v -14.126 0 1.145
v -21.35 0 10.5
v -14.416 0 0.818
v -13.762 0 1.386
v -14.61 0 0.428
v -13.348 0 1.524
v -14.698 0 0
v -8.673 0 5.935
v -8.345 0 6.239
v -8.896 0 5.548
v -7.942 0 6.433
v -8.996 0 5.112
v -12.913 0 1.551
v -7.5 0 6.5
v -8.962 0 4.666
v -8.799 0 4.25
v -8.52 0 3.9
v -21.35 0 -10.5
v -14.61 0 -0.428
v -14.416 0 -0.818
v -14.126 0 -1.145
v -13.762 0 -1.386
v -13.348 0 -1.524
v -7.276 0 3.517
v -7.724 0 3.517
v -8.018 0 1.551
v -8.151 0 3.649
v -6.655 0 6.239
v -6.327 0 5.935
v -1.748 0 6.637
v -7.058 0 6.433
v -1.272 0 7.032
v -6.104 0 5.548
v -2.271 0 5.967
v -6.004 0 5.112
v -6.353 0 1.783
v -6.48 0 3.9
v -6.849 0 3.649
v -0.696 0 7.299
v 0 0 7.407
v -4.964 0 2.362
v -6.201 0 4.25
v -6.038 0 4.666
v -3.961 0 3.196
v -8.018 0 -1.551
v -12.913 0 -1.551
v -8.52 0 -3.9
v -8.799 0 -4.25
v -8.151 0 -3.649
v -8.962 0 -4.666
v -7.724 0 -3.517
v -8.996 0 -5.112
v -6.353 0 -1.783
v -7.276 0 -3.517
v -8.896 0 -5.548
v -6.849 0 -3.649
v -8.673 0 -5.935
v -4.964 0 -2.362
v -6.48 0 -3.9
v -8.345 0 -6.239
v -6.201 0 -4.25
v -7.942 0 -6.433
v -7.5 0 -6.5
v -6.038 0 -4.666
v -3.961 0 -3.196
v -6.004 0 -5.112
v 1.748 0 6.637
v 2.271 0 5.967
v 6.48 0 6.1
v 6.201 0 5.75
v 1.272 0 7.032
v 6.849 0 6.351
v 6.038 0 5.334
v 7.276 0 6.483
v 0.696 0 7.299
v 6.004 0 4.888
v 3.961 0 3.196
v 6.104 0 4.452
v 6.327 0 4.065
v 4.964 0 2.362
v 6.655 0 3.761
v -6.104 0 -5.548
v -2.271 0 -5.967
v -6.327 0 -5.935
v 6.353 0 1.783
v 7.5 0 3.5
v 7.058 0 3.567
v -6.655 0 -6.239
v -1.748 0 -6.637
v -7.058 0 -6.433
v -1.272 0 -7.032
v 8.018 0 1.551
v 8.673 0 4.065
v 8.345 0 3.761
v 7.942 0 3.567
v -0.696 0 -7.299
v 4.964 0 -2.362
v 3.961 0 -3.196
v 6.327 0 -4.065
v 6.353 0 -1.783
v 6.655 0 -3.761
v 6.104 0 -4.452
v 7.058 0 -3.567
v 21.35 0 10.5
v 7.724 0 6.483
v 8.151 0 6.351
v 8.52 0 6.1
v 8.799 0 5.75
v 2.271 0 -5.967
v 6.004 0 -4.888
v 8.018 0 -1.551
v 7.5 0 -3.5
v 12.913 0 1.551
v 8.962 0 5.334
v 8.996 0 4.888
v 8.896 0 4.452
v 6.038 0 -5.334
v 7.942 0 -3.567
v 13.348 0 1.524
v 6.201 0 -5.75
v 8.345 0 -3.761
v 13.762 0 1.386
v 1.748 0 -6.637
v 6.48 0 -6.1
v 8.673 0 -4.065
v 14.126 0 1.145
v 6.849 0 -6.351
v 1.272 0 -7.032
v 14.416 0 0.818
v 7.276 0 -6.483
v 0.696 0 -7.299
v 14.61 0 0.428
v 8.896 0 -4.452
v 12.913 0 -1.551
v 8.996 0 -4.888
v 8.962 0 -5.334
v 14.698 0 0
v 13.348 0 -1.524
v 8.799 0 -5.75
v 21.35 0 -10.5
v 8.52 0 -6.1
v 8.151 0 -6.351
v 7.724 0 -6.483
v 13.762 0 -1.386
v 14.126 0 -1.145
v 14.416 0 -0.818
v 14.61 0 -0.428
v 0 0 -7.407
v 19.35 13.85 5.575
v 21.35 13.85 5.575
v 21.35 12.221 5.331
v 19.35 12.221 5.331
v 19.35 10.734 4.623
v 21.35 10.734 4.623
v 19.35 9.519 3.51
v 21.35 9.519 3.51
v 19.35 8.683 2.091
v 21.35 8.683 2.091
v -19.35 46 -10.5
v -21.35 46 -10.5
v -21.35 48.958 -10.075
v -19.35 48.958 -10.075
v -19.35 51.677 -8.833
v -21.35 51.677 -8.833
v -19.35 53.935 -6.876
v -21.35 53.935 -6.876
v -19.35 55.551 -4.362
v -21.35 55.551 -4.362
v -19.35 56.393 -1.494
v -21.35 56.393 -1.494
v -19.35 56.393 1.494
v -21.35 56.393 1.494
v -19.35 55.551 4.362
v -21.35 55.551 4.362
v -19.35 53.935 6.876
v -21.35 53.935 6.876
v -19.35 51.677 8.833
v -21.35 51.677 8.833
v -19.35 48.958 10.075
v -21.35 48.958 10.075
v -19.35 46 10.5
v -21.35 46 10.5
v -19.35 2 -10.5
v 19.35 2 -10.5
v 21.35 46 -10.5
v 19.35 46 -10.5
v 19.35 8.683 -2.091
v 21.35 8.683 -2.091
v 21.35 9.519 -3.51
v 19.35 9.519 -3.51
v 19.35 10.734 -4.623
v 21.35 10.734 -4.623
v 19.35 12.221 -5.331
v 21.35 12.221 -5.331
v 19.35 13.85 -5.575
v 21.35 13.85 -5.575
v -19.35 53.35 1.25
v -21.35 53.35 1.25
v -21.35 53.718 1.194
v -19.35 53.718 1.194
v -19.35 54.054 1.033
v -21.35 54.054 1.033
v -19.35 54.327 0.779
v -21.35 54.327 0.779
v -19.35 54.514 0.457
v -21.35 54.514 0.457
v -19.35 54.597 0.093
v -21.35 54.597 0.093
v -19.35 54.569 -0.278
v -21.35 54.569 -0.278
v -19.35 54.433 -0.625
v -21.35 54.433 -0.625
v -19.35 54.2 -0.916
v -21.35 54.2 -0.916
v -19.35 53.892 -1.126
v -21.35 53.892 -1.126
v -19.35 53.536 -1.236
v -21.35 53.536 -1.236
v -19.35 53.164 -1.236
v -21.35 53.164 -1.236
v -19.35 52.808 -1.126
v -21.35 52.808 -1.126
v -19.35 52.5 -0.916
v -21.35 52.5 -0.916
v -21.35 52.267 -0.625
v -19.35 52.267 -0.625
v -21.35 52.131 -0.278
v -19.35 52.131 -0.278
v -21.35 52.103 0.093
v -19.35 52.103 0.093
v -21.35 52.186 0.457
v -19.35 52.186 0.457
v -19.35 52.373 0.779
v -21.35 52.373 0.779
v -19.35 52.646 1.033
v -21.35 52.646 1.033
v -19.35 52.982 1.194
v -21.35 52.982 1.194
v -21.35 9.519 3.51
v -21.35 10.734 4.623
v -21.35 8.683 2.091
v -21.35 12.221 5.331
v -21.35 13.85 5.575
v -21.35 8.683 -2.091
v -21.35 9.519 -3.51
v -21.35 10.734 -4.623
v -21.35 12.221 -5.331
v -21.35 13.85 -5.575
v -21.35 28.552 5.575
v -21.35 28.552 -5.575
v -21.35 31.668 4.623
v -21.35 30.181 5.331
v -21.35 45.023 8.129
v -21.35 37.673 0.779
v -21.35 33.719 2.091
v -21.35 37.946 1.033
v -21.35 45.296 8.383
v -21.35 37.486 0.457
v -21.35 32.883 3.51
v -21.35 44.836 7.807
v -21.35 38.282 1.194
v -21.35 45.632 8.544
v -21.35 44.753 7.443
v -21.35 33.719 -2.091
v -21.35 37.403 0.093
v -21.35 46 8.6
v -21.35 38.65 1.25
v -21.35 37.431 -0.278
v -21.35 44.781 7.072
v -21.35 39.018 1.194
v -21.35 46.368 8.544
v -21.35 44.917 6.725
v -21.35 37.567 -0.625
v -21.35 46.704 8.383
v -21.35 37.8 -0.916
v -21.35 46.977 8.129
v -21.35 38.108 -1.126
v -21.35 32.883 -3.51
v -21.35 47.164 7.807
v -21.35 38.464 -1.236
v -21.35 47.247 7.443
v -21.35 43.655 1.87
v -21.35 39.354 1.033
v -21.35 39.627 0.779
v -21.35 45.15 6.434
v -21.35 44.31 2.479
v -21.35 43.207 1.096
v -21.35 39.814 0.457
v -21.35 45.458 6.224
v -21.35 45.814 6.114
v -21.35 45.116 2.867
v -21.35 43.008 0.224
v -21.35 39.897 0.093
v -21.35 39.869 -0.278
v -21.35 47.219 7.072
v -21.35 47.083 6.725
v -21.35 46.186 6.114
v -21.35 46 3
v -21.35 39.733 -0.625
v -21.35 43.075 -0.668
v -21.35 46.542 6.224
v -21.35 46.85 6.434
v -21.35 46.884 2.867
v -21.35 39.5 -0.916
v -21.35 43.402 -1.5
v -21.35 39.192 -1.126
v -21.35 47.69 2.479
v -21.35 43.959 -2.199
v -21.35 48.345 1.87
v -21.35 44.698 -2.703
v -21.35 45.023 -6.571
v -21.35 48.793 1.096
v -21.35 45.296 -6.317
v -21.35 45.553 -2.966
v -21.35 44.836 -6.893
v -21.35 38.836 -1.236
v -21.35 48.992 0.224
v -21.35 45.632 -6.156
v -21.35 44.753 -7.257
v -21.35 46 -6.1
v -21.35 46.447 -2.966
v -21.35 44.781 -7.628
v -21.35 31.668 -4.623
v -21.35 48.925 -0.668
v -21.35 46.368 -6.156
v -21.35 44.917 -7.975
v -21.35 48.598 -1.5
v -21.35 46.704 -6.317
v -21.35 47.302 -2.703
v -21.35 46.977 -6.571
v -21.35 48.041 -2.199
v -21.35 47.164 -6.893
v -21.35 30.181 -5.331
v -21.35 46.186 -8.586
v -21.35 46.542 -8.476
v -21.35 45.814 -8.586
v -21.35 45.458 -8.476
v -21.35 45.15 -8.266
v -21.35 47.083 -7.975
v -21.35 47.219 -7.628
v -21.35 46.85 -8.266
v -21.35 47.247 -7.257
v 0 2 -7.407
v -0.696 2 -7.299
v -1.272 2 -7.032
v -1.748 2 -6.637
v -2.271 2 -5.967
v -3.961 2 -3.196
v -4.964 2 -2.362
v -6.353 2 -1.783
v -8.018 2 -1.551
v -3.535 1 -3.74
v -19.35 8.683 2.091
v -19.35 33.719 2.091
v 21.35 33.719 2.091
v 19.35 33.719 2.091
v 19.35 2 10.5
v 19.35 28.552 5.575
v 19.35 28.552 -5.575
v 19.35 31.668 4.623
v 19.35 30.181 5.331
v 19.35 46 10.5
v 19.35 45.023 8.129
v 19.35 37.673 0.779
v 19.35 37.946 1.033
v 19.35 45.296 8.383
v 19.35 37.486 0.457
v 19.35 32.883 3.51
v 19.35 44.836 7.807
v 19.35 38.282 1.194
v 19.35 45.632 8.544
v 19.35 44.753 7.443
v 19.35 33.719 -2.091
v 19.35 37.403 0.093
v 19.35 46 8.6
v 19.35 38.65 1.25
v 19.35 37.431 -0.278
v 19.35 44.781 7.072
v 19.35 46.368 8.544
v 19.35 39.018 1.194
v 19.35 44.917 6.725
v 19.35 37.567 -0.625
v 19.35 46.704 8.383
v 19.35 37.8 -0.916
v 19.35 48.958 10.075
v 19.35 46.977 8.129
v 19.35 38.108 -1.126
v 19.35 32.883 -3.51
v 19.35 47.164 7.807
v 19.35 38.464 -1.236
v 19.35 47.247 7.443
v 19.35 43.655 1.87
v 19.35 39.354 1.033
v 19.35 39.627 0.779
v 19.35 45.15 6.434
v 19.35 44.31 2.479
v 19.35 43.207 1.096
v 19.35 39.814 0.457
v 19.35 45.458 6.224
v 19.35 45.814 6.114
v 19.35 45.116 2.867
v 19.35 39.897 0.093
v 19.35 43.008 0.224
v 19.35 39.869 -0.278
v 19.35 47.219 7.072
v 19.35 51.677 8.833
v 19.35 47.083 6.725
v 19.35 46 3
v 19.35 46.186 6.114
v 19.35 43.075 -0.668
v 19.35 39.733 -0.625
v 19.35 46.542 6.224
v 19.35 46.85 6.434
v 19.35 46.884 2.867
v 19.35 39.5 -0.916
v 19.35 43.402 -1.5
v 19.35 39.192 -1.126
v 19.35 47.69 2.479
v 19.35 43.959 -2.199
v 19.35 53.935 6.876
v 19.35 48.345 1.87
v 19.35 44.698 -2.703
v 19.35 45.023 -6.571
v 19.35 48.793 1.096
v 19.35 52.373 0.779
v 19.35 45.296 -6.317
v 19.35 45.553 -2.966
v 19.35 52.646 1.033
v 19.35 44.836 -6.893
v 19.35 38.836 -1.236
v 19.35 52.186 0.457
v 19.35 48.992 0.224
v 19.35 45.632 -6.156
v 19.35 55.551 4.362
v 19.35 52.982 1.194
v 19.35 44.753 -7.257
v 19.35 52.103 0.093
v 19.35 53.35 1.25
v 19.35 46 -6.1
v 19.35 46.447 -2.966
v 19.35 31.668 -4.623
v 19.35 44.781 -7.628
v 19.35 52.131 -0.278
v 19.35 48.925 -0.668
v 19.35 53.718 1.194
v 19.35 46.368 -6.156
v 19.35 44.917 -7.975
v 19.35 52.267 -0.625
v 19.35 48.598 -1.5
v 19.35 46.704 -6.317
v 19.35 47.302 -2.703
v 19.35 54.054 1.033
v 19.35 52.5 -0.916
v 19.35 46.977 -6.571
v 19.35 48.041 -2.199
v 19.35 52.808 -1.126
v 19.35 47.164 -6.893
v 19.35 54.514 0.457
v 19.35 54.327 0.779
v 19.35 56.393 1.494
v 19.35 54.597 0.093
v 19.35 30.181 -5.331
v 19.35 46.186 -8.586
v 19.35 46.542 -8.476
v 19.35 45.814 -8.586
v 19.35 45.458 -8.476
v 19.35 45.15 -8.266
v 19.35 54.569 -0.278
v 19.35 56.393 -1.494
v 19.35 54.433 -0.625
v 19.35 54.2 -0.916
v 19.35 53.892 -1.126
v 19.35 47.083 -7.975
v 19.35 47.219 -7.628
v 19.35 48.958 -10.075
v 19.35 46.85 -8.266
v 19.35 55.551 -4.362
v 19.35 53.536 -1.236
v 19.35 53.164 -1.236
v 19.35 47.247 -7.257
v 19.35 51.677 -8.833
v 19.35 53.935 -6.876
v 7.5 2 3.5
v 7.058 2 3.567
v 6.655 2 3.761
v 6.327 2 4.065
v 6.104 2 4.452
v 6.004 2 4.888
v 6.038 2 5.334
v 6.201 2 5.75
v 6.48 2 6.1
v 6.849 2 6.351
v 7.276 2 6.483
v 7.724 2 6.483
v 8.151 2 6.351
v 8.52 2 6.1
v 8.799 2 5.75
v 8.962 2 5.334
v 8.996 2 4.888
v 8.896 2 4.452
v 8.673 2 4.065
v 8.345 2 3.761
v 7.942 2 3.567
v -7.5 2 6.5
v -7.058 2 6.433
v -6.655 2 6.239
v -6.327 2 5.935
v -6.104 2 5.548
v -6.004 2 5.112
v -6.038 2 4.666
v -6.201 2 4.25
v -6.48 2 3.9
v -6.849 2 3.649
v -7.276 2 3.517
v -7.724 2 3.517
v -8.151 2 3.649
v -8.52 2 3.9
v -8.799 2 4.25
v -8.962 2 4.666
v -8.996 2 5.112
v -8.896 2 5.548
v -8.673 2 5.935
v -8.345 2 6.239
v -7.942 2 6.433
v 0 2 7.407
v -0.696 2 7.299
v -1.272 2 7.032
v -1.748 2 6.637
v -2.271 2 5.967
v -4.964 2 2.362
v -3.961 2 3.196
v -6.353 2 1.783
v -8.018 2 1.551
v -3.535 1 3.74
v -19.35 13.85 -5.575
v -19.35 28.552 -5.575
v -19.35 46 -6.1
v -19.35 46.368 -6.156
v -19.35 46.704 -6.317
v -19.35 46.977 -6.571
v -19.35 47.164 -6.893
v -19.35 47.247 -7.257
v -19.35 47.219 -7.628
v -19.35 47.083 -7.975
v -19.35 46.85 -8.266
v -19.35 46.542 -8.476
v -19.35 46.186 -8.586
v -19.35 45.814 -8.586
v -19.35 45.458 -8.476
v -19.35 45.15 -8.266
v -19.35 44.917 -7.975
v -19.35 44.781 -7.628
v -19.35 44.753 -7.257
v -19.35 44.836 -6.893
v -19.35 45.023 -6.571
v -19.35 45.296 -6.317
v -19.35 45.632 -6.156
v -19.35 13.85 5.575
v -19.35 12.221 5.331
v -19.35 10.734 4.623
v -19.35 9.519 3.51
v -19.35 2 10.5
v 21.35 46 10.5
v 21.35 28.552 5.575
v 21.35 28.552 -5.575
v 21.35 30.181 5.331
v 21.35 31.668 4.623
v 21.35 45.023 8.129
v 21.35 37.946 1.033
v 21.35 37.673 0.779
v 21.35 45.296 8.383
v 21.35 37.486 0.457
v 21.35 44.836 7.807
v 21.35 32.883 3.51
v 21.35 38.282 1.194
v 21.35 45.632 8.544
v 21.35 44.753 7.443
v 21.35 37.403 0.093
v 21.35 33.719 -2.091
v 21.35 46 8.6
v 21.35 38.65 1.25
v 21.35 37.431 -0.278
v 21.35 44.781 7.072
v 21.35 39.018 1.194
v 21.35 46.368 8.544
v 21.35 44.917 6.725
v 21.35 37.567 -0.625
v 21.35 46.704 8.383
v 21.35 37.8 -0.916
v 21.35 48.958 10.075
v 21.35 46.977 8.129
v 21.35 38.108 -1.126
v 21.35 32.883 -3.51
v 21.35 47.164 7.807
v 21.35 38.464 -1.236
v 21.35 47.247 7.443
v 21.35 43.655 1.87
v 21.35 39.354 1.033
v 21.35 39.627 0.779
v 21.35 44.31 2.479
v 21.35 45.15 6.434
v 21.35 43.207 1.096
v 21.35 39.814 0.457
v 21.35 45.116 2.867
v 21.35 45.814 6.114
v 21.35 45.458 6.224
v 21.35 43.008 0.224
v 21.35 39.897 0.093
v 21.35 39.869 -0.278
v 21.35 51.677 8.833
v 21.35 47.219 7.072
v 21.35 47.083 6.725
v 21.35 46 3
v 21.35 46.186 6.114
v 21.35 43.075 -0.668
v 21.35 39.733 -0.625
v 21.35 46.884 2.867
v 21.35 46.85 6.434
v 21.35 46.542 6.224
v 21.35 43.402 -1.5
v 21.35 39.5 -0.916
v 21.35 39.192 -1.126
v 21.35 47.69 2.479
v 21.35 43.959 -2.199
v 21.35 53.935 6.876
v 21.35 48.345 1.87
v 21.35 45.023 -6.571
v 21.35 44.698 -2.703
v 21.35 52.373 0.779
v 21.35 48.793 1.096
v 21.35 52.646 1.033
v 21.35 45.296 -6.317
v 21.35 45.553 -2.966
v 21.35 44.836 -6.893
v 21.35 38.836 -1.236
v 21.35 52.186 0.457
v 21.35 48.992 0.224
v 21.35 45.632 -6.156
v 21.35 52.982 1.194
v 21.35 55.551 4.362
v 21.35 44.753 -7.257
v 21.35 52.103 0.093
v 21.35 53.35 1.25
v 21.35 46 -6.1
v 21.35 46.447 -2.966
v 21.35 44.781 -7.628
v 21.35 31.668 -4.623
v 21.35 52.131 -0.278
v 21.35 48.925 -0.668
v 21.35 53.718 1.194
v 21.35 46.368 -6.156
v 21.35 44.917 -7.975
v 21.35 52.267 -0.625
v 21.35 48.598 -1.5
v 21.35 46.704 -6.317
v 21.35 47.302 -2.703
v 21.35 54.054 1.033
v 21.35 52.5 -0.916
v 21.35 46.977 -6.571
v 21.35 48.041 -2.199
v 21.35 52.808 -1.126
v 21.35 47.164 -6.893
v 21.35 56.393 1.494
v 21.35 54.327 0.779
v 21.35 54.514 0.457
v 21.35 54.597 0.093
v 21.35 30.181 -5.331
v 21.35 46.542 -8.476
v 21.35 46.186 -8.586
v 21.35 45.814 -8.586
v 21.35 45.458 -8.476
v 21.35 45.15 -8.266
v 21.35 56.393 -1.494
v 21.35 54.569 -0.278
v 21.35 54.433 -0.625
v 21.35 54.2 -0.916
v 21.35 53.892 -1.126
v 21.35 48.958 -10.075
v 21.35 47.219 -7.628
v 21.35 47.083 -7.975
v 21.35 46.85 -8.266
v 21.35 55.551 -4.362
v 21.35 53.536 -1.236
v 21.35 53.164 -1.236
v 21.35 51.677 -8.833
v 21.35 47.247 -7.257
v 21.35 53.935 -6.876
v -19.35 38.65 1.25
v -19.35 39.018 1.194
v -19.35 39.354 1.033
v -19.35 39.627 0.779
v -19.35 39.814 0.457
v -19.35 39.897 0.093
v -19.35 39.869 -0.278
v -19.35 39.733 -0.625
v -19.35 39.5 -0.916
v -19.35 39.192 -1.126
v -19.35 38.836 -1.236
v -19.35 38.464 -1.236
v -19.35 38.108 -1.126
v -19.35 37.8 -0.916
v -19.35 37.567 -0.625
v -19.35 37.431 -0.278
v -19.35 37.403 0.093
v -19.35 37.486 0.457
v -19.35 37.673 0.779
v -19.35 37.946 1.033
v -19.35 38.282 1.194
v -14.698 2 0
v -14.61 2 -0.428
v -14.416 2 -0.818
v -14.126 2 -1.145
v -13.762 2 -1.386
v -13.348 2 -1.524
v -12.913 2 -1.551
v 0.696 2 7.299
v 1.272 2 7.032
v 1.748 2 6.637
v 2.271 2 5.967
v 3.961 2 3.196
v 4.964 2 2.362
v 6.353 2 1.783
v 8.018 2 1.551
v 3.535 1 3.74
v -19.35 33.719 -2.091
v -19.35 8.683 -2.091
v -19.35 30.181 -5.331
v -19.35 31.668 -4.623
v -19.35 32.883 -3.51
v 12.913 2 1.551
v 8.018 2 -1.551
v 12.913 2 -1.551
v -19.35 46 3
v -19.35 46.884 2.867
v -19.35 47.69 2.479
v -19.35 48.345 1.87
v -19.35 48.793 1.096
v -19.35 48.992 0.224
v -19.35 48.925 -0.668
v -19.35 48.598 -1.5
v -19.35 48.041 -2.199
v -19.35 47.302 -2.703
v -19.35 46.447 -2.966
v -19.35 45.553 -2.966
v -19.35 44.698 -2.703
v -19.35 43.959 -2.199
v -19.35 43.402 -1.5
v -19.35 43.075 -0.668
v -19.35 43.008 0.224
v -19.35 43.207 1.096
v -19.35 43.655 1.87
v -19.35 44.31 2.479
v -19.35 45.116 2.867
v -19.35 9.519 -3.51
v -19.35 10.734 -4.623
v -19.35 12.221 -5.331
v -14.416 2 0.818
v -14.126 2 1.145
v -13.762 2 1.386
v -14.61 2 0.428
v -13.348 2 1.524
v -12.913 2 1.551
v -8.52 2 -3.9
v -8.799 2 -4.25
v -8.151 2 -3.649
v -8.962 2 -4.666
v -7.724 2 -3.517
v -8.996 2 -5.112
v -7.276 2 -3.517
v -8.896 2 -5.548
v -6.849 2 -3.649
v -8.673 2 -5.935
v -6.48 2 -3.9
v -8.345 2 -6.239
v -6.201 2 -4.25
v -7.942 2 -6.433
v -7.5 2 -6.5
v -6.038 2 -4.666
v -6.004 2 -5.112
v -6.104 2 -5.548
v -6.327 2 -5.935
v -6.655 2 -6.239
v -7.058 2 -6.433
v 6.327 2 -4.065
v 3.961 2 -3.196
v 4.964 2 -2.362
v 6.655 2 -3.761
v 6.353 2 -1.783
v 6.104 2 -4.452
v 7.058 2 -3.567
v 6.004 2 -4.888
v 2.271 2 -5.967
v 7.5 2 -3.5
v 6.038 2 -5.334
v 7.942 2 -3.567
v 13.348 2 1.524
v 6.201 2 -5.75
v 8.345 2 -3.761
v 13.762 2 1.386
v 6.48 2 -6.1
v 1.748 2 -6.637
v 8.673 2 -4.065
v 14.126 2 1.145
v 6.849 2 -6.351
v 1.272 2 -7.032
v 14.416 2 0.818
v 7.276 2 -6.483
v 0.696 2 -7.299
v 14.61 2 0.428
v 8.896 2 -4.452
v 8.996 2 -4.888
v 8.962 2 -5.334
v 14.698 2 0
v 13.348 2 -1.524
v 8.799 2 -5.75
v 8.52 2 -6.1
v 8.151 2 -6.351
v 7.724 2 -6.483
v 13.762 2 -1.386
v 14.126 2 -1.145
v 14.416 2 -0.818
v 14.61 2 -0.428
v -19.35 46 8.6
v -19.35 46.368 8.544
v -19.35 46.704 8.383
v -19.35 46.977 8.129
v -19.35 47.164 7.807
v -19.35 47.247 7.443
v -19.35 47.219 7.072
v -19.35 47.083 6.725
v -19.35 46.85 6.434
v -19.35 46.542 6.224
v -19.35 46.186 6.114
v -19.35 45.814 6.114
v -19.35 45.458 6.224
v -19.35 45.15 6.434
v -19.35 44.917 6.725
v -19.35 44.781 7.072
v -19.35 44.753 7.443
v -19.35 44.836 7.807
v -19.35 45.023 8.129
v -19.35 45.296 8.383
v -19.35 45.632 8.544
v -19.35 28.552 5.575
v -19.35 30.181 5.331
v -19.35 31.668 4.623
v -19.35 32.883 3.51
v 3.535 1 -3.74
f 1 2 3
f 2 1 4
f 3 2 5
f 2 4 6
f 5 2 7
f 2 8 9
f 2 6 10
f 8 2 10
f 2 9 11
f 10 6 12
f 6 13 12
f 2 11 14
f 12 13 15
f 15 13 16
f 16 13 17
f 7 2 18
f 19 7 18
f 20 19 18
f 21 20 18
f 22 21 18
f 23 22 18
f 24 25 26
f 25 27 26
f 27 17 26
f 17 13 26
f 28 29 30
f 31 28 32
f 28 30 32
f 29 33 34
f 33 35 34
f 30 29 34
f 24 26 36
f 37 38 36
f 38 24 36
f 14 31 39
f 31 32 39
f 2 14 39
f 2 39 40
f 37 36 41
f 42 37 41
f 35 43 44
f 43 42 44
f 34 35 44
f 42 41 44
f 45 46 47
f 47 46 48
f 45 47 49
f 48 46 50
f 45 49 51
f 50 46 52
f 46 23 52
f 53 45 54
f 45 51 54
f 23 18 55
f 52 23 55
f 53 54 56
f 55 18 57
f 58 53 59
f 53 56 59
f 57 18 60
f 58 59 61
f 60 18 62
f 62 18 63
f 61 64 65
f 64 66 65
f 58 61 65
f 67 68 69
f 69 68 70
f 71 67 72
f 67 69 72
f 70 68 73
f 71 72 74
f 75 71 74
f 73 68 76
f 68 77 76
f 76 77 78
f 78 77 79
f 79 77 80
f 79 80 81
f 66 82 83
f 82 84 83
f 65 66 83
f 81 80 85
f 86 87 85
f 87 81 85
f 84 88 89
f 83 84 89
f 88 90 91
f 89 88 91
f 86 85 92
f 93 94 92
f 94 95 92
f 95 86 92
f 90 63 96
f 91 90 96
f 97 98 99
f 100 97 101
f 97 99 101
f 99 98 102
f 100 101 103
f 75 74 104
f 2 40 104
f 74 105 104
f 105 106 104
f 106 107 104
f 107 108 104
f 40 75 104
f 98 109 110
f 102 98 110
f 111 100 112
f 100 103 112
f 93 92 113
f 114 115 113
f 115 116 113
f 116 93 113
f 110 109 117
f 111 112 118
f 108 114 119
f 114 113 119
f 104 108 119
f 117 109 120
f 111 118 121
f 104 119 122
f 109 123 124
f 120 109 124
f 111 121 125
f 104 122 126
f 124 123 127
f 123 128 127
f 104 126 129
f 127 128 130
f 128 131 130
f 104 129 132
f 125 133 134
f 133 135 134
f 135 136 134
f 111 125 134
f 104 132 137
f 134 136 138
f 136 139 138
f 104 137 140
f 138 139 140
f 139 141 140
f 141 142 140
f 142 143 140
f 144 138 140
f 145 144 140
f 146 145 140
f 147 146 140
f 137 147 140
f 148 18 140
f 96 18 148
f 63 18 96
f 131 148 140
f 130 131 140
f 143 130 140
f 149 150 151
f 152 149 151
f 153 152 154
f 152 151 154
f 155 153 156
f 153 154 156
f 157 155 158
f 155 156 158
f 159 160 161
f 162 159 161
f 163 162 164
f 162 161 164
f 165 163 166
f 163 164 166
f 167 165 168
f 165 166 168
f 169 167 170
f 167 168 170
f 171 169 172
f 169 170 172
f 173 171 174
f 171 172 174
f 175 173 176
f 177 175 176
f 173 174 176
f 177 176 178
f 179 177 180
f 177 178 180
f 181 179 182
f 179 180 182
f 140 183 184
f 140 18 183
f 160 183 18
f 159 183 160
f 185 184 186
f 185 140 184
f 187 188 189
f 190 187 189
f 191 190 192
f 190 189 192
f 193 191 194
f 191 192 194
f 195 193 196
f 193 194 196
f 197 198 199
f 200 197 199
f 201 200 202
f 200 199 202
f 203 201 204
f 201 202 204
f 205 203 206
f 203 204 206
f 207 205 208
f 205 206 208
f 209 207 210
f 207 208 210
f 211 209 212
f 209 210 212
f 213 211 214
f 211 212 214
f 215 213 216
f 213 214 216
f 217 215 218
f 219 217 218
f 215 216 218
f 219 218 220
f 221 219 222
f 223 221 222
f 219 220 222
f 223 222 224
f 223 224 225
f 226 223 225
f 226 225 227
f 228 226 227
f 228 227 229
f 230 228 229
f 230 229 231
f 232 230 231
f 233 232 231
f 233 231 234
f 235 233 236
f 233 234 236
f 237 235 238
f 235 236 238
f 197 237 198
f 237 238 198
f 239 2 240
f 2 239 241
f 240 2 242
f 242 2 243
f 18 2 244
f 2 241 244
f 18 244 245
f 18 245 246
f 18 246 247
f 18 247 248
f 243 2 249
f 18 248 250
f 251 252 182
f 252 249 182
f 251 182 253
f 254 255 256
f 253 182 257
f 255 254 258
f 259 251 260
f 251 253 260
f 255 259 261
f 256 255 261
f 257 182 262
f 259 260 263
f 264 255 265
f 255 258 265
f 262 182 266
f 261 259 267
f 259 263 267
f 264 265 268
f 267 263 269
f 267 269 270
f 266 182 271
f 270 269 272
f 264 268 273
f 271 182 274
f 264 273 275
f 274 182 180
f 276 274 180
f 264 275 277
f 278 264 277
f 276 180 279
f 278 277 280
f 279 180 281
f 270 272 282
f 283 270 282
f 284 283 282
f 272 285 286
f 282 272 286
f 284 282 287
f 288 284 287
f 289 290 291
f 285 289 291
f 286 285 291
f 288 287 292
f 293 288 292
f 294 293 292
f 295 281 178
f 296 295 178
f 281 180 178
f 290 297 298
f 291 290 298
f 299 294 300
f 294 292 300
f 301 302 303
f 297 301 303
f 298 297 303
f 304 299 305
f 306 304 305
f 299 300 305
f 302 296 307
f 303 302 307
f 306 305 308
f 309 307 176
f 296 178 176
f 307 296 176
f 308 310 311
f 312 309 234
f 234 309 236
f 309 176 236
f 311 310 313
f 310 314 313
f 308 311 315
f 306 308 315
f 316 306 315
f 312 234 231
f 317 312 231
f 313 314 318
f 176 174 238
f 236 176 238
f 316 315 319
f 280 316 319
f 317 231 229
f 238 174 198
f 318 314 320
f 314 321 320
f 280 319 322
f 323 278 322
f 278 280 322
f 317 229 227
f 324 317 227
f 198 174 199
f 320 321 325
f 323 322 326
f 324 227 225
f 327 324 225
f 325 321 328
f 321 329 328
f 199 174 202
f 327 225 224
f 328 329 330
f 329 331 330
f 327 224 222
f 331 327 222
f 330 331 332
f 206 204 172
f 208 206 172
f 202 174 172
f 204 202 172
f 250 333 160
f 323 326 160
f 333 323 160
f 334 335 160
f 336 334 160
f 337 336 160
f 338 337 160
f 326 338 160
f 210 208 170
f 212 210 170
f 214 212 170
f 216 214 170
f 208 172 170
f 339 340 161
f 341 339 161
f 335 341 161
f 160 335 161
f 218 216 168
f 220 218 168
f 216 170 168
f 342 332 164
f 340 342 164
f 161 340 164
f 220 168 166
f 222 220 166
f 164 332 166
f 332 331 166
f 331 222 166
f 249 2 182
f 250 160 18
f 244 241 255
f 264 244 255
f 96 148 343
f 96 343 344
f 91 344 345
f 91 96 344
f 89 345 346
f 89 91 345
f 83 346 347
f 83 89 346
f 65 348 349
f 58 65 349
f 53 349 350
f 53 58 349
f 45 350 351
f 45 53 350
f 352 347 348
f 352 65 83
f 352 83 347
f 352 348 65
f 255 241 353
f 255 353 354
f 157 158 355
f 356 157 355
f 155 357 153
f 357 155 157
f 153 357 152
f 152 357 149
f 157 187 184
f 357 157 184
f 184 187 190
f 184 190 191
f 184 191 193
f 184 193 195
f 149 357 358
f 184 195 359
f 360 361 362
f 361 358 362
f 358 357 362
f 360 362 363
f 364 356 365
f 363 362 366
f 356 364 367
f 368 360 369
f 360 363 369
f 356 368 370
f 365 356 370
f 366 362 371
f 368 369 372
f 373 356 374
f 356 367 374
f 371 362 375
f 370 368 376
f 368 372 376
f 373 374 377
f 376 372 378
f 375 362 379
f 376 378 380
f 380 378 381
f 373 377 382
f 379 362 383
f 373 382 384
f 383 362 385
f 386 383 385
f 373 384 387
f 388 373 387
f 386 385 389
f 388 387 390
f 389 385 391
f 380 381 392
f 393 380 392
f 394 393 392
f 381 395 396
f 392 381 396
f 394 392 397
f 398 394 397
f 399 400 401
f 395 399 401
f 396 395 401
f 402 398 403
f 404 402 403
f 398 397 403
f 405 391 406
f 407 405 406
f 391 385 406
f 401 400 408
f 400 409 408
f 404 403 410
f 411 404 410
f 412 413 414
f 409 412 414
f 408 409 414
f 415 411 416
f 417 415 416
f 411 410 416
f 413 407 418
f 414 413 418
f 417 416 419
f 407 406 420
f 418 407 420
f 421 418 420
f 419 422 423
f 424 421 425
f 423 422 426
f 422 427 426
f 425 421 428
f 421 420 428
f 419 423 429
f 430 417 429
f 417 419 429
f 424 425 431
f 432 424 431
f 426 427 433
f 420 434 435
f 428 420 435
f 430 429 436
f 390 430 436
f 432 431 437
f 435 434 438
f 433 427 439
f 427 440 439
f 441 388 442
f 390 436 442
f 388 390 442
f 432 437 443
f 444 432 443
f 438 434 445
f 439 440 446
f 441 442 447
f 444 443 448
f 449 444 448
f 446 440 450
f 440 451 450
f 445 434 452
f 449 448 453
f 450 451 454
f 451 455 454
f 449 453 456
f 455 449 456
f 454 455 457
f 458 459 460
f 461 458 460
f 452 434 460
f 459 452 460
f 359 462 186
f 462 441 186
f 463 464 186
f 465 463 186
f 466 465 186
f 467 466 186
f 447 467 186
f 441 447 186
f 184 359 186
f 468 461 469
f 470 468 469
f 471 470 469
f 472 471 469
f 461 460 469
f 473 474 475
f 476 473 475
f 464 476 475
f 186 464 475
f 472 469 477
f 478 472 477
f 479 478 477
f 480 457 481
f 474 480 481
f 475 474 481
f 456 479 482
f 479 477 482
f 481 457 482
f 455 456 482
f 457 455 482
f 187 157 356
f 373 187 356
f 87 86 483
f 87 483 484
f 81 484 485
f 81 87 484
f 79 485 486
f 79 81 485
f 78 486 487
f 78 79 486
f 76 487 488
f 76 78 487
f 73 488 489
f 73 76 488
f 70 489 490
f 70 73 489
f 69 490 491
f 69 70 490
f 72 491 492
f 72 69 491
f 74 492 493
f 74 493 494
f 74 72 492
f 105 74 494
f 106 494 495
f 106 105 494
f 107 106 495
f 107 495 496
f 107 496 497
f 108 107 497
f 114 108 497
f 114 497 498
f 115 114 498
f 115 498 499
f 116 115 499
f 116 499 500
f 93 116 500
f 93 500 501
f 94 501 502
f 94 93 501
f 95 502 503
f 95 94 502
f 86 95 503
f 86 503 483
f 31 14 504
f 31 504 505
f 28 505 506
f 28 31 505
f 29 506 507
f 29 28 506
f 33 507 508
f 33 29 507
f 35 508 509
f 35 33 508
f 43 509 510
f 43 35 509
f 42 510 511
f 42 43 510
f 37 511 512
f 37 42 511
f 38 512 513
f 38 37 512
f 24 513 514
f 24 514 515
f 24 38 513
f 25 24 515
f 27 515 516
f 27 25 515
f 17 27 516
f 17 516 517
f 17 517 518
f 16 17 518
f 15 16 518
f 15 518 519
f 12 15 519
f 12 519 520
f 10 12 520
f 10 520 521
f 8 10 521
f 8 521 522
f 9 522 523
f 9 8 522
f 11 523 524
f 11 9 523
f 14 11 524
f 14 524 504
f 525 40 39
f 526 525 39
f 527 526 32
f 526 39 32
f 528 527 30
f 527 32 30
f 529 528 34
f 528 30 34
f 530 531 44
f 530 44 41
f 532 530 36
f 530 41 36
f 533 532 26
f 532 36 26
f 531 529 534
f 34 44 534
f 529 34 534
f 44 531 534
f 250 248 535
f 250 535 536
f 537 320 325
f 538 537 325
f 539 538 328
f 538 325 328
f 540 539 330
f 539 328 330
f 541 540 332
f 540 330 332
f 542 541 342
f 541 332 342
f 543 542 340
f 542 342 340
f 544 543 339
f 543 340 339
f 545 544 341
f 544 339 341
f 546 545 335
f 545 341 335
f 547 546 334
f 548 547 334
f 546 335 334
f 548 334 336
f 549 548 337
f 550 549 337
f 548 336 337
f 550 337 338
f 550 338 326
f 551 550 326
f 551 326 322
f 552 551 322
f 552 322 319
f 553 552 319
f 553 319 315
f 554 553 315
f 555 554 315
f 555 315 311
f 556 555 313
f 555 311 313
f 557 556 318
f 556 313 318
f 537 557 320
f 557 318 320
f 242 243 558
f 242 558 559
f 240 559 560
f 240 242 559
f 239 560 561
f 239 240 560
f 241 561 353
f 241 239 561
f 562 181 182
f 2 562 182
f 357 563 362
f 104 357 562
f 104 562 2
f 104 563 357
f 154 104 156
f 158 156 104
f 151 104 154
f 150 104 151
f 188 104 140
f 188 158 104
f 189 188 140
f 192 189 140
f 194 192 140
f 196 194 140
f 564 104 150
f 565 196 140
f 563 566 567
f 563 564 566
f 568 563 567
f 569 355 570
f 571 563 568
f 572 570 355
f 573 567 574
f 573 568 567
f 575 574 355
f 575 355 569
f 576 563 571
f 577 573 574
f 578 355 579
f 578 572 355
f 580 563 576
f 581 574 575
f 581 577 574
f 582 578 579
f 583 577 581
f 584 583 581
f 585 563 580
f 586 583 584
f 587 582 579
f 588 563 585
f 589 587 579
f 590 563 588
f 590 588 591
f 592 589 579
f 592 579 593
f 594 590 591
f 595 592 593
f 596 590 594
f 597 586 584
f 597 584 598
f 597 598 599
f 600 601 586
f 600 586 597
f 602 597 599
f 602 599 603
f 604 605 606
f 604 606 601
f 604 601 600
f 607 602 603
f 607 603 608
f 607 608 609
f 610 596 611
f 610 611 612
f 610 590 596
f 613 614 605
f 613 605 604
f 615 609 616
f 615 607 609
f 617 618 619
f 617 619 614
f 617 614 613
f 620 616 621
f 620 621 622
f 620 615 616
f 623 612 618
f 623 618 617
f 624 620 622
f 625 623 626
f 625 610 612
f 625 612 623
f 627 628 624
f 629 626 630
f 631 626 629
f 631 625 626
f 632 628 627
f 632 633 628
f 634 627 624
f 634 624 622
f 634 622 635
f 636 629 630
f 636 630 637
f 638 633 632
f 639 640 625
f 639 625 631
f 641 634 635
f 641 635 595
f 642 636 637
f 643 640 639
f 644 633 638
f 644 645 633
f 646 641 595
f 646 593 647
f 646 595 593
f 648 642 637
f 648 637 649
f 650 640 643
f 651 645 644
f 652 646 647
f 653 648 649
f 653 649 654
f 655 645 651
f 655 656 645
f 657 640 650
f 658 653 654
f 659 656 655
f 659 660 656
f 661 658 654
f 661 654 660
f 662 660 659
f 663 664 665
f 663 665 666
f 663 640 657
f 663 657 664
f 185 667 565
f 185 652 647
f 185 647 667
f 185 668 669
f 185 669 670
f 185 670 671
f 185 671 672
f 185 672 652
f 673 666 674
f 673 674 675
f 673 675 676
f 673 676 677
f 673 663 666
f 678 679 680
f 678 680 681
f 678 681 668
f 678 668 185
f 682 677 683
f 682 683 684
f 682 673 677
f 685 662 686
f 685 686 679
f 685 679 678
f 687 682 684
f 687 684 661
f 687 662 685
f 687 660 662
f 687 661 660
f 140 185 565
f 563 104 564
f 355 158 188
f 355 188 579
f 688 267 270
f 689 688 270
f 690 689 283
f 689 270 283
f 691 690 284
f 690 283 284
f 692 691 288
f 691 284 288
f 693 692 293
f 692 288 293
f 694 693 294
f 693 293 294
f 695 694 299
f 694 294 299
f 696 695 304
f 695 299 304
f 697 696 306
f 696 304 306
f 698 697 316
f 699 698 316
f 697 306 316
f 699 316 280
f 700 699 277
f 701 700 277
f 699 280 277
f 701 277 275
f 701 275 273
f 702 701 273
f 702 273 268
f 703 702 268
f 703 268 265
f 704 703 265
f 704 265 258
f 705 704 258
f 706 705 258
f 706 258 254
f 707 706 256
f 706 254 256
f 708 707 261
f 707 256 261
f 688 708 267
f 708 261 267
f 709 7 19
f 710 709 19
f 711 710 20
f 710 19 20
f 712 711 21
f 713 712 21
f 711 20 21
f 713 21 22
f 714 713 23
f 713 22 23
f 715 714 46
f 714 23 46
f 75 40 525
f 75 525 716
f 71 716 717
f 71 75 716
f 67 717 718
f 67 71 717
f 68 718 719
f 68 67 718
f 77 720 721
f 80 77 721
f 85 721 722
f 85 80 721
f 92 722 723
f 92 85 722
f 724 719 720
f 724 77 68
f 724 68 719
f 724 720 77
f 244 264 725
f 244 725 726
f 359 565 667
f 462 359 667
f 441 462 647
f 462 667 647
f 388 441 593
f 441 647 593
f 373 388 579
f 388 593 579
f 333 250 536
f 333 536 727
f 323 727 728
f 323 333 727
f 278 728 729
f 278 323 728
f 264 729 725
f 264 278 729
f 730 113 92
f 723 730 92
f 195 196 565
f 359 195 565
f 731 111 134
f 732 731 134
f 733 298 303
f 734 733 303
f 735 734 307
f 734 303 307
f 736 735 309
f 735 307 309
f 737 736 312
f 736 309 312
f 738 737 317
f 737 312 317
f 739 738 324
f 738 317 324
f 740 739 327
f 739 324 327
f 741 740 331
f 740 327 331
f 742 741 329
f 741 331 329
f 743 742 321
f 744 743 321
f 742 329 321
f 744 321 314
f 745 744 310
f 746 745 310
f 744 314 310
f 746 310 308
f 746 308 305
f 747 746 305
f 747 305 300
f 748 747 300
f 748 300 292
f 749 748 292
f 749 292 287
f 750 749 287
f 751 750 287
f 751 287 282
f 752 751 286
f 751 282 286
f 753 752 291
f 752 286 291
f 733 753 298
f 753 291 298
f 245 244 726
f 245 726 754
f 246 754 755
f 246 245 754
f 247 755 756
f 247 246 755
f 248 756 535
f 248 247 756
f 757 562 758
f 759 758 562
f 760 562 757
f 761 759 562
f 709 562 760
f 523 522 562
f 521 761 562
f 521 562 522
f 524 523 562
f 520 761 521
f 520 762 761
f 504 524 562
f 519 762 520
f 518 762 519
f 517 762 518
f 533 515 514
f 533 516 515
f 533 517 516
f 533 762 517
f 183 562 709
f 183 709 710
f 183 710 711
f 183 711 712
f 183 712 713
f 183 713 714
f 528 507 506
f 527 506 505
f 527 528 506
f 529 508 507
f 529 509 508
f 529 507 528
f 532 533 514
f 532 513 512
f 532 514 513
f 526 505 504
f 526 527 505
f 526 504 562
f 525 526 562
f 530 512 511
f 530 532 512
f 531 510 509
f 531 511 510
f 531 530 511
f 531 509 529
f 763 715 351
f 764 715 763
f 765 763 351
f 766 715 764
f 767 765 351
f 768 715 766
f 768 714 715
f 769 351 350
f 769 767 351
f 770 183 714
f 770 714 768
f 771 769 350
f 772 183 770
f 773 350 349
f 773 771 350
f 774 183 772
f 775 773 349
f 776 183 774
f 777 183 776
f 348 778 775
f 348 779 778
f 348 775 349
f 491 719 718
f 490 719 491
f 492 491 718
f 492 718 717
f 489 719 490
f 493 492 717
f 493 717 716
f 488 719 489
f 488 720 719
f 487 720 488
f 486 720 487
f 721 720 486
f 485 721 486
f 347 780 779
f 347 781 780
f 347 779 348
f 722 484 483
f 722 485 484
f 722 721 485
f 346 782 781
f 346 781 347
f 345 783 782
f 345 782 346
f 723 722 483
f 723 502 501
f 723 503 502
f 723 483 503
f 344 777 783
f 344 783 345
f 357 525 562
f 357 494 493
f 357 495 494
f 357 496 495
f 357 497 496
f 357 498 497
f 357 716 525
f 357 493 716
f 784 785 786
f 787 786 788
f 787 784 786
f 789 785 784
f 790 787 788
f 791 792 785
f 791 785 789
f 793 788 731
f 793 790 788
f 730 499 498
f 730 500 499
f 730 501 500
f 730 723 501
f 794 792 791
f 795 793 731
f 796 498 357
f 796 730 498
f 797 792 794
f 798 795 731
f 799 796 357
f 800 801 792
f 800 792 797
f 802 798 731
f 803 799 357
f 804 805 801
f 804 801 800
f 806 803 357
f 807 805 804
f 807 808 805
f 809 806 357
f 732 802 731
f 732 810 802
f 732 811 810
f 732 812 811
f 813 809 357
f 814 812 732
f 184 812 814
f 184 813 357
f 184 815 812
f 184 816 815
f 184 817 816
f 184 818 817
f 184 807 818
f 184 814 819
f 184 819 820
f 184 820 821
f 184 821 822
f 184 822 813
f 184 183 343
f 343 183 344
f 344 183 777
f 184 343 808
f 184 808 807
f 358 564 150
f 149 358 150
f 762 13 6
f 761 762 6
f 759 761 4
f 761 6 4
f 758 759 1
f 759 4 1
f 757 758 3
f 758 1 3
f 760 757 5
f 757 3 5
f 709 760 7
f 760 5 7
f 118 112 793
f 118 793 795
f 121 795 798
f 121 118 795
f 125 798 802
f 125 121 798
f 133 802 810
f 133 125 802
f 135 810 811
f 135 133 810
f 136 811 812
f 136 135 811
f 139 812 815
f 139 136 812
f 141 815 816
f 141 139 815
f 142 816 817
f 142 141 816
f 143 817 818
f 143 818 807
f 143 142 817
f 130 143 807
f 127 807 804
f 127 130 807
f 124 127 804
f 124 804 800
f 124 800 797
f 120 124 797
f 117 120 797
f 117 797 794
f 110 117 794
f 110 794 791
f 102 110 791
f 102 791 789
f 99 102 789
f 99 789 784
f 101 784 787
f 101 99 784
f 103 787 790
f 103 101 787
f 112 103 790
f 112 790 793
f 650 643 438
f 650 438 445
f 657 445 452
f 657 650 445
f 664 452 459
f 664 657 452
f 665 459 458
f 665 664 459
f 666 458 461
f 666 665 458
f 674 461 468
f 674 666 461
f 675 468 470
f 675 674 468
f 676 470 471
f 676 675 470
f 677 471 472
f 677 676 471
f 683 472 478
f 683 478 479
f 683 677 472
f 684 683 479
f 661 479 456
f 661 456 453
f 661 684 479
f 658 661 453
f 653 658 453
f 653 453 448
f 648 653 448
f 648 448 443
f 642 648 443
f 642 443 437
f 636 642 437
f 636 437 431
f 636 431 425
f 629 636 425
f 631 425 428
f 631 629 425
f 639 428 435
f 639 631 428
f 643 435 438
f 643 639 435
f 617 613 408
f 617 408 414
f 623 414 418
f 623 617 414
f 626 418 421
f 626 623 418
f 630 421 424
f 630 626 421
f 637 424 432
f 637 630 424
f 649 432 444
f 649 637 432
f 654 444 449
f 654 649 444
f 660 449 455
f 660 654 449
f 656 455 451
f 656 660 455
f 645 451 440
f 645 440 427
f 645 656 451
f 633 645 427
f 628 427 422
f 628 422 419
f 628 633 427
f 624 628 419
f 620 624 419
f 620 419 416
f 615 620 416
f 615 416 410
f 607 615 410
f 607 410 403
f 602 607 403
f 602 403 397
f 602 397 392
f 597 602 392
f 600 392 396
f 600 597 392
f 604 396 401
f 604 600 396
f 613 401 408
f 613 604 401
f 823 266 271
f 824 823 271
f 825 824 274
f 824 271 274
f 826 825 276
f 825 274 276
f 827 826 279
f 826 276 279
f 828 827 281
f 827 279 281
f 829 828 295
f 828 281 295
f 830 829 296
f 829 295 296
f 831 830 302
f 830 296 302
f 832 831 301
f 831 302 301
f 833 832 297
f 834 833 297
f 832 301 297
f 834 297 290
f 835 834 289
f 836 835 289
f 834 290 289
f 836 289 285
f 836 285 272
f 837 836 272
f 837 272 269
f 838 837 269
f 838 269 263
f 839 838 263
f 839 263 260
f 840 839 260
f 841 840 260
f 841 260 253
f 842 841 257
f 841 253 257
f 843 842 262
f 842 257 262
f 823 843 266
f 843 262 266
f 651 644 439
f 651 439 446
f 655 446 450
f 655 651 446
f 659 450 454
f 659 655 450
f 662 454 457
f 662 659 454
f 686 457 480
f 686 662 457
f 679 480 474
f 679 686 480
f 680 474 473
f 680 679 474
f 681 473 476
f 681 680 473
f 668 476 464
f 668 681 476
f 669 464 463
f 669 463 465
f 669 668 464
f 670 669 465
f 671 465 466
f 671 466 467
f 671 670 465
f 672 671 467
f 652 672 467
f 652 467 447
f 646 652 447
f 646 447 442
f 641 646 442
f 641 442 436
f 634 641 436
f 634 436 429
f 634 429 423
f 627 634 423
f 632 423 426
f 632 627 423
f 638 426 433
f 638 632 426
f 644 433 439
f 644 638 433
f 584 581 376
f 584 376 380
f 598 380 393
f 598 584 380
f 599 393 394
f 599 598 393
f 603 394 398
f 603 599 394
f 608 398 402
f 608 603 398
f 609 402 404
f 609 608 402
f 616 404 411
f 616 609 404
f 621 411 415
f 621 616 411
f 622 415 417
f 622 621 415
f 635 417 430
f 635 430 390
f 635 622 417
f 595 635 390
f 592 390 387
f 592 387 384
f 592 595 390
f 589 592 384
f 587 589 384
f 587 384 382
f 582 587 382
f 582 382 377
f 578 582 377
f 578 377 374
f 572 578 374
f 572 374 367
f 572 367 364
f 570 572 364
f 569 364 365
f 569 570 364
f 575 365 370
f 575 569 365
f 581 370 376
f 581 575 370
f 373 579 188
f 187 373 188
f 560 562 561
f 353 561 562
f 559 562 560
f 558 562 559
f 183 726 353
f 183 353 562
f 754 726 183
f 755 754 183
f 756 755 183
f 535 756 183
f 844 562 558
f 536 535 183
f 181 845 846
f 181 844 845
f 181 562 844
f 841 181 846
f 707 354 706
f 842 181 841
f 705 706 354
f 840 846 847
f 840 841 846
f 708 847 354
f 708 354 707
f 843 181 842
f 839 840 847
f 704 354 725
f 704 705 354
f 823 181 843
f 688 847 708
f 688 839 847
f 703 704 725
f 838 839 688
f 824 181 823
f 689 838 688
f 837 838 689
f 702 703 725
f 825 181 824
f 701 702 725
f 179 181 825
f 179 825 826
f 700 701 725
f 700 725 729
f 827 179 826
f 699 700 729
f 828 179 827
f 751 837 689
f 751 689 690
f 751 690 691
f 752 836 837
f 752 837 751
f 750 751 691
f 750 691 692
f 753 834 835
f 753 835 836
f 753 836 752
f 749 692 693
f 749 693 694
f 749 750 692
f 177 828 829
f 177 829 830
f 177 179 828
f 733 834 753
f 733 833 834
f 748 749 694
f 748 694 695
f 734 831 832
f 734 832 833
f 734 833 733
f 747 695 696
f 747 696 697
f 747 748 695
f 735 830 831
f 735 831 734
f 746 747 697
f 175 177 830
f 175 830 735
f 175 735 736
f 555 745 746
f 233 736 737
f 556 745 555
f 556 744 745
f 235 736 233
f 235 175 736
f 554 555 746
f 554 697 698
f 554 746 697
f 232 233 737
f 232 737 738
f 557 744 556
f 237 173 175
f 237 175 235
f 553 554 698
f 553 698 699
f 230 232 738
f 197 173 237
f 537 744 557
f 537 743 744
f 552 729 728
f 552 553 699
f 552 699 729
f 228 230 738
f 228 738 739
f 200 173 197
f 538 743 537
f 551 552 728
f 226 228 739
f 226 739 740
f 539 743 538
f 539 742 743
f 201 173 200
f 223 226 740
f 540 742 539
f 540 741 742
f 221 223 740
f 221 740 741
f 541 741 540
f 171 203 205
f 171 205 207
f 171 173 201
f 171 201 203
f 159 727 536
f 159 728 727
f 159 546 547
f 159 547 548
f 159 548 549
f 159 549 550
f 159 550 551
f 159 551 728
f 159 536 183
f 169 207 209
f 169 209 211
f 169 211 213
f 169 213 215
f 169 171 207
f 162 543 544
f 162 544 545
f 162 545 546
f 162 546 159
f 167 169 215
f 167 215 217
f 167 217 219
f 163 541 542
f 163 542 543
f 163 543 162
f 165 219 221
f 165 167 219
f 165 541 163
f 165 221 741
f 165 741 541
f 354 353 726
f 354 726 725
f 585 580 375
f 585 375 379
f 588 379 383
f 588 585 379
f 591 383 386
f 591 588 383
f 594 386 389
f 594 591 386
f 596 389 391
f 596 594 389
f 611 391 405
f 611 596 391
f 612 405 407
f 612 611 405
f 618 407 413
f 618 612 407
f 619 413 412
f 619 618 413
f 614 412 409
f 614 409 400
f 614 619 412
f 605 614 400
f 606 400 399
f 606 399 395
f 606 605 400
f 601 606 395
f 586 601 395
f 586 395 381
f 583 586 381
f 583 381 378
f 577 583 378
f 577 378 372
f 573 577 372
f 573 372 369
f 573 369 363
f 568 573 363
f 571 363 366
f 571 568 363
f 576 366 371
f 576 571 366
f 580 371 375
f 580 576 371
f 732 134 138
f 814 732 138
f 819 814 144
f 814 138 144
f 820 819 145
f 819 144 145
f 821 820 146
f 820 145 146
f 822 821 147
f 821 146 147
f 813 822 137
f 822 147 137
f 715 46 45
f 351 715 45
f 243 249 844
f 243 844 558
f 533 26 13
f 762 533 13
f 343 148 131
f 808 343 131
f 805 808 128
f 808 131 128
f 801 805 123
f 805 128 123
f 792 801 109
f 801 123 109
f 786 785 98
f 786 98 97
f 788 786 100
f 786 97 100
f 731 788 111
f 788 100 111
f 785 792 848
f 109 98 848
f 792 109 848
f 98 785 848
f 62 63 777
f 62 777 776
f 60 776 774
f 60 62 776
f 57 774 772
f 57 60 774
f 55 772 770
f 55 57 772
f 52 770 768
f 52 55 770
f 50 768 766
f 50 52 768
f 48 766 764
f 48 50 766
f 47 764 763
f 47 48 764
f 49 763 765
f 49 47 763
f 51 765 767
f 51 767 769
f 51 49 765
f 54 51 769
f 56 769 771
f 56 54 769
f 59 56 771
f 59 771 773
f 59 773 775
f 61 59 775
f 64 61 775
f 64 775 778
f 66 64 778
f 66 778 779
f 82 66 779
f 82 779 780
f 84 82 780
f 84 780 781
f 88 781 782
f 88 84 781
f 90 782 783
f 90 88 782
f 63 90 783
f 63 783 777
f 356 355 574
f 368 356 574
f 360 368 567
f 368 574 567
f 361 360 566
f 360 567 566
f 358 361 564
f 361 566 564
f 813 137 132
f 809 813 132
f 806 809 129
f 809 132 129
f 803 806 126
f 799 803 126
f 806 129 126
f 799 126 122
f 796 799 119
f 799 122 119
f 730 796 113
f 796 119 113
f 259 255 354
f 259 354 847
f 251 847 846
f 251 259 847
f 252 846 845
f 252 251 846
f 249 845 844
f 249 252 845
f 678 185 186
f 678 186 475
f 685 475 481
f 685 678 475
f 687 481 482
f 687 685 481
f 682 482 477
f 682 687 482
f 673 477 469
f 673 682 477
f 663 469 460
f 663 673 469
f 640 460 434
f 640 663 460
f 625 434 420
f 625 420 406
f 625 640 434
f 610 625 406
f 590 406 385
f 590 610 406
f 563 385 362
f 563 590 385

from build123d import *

# Parameters (mm, degrees)
SKETCH_1_W      = 42.7
SKETCH_1_H      = 21
SKETCH_1_R      = 1.5
EXTRUDE_1_DEPTH = 2
SKETCH_2_R      = 1.25
SKETCH_2_R_2    = 3
EXTRUDE_2_DEPTH = 2


with BuildPart() as part:
    # 草图1 → 凸台-拉伸1 (new body)
    with BuildSketch(Plane(origin=(0, 0, 0), x_dir=(1, 0, 0), z_dir=(0, 1, 0))):
        Rectangle(SKETCH_1_W, SKETCH_1_H)
        with Locations(Location((7.5, 5, 0), (0, 0, 270))):
            Circle(SKETCH_1_R, mode=Mode.SUBTRACT)
        with Locations(Location((7.5, -5, 0), (0, 0, 90))):
            Circle(SKETCH_1_R, mode=Mode.SUBTRACT)
        with Locations(Location((-7.5, -5, 0), (0, 0, 270))):
            Circle(SKETCH_1_R, mode=Mode.SUBTRACT)
        with Locations(Location((-7.5, 5, 0), (0, 0, 90))):
            Circle(SKETCH_1_R, mode=Mode.SUBTRACT)
        with BuildLine():
            Line((8.017950723, 1.550908082), (12.912587519, 1.550908082))
            ThreePointArc((12.912587519, 1.550908082), (14.126270768, 1.145131224), (14.697546856, 0))
            ThreePointArc((14.697546856, 0), (14.126270768, -1.145131224), (12.912587519, -1.550908082))
            Line((12.912587519, -1.550908082), (8.017950723, -1.550908082))
            add(Edge.make_bspline(
                [(0, -7.407271614), (2.092471107, -7.358009404), (3.043739342, -2.951912586), (6.007732496, -1.626733157), (8.017950723, -1.550908082)],
                knots=[0, 0, 0, 0, 0.496822763, 1, 1, 1, 1], degree=3))
            add(Edge.make_bspline(
                [(0, -7.407271614), (-2.092471107, -7.358009404), (-3.043739342, -2.951912586), (-6.007732496, -1.626733157), (-8.017950723, -1.550908082)],
                knots=[0, 0, 0, 0, 0.496822763, 1, 1, 1, 1], degree=3))
            Line((-8.017950723, -1.550908082), (-12.912587519, -1.550908082))
            ThreePointArc((-12.912587519, -1.550908082), (-14.126270768, -1.145131224), (-14.697546856, 0))
            ThreePointArc((-14.697546856, 0), (-14.126270768, 1.145131224), (-12.912587519, 1.550908082))
            Line((-12.912587519, 1.550908082), (-8.017950723, 1.550908082))
            add(Edge.make_bspline(
                [(0, 7.407271614), (-2.092471107, 7.358009404), (-3.043739342, 2.951912586), (-6.007732496, 1.626733157), (-8.017950723, 1.550908082)],
                knots=[0, 0, 0, 0, 0.496822763, 1, 1, 1, 1], degree=3))
            add(Edge.make_bspline(
                [(0, 7.407271614), (2.092471107, 7.358009404), (3.043739342, 2.951912586), (6.007732496, 1.626733157), (8.017950723, 1.550908082)],
                knots=[0, 0, 0, 0, 0.496822763, 1, 1, 1, 1], degree=3))
        make_face(mode=Mode.SUBTRACT)
    extrude(amount=EXTRUDE_1_DEPTH)

    # 草图2 → 凸台-拉伸2 (add)
    with BuildSketch(Plane.ZY.offset(21.35)):
        with BuildLine():
            Line((-10.5, 2), (-10.5, 46))
            ThreePointArc((-10.5, 46), (0, 56.5), (10.5, 46))
            Line((10.5, 46), (10.5, 2))
            Line((10.5, 2), (-10.5, 2))
        make_face()
        with Locations((0, 38.65)):
            Circle(SKETCH_2_R, mode=Mode.SUBTRACT)
        with Locations((-7.35, 46)):
            Circle(SKETCH_2_R, mode=Mode.SUBTRACT)
        with Locations((0, 53.35)):
            Circle(SKETCH_2_R, mode=Mode.SUBTRACT)
        with Locations((7.35, 46)):
            Circle(SKETCH_2_R, mode=Mode.SUBTRACT)
        with Locations((0, 46)):
            Circle(SKETCH_2_R_2, mode=Mode.SUBTRACT)
        with BuildLine():
            Line((-2.091438456, 33.71946821), (-2.091438456, 8.682620376))
            ThreePointArc((-2.091438456, 8.682620376), (-4.622608783, 10.734209017), (-5.574745456, 13.850179963))
            Line((-5.574745456, 13.850179963), (-5.574745456, 28.551908623))
            ThreePointArc((-5.574745456, 28.551908623), (-4.622608783, 31.667879569), (-2.091438456, 33.71946821))
        make_face(mode=Mode.SUBTRACT)
        with BuildLine():
            Line((5.574745456, 28.551908623), (5.574745456, 13.850179963))
            ThreePointArc((5.574745456, 13.850179963), (4.622608783, 10.734209017), (2.091438456, 8.682620376))
            Line((2.091438456, 8.682620376), (2.091438456, 33.71946821))
            ThreePointArc((2.091438456, 33.71946821), (4.622608783, 31.667879569), (5.574745456, 28.551908623))
        make_face(mode=Mode.SUBTRACT)
    extrude_2 = extrude(amount=-EXTRUDE_2_DEPTH)

    # 镜向1: 凸台-拉伸2 across plane
    add(extrude_2.mirror(Plane(origin=(0, 0, 0), x_dir=(0, 0, 1), z_dir=(1, 0, 0))))


solid = part.part
